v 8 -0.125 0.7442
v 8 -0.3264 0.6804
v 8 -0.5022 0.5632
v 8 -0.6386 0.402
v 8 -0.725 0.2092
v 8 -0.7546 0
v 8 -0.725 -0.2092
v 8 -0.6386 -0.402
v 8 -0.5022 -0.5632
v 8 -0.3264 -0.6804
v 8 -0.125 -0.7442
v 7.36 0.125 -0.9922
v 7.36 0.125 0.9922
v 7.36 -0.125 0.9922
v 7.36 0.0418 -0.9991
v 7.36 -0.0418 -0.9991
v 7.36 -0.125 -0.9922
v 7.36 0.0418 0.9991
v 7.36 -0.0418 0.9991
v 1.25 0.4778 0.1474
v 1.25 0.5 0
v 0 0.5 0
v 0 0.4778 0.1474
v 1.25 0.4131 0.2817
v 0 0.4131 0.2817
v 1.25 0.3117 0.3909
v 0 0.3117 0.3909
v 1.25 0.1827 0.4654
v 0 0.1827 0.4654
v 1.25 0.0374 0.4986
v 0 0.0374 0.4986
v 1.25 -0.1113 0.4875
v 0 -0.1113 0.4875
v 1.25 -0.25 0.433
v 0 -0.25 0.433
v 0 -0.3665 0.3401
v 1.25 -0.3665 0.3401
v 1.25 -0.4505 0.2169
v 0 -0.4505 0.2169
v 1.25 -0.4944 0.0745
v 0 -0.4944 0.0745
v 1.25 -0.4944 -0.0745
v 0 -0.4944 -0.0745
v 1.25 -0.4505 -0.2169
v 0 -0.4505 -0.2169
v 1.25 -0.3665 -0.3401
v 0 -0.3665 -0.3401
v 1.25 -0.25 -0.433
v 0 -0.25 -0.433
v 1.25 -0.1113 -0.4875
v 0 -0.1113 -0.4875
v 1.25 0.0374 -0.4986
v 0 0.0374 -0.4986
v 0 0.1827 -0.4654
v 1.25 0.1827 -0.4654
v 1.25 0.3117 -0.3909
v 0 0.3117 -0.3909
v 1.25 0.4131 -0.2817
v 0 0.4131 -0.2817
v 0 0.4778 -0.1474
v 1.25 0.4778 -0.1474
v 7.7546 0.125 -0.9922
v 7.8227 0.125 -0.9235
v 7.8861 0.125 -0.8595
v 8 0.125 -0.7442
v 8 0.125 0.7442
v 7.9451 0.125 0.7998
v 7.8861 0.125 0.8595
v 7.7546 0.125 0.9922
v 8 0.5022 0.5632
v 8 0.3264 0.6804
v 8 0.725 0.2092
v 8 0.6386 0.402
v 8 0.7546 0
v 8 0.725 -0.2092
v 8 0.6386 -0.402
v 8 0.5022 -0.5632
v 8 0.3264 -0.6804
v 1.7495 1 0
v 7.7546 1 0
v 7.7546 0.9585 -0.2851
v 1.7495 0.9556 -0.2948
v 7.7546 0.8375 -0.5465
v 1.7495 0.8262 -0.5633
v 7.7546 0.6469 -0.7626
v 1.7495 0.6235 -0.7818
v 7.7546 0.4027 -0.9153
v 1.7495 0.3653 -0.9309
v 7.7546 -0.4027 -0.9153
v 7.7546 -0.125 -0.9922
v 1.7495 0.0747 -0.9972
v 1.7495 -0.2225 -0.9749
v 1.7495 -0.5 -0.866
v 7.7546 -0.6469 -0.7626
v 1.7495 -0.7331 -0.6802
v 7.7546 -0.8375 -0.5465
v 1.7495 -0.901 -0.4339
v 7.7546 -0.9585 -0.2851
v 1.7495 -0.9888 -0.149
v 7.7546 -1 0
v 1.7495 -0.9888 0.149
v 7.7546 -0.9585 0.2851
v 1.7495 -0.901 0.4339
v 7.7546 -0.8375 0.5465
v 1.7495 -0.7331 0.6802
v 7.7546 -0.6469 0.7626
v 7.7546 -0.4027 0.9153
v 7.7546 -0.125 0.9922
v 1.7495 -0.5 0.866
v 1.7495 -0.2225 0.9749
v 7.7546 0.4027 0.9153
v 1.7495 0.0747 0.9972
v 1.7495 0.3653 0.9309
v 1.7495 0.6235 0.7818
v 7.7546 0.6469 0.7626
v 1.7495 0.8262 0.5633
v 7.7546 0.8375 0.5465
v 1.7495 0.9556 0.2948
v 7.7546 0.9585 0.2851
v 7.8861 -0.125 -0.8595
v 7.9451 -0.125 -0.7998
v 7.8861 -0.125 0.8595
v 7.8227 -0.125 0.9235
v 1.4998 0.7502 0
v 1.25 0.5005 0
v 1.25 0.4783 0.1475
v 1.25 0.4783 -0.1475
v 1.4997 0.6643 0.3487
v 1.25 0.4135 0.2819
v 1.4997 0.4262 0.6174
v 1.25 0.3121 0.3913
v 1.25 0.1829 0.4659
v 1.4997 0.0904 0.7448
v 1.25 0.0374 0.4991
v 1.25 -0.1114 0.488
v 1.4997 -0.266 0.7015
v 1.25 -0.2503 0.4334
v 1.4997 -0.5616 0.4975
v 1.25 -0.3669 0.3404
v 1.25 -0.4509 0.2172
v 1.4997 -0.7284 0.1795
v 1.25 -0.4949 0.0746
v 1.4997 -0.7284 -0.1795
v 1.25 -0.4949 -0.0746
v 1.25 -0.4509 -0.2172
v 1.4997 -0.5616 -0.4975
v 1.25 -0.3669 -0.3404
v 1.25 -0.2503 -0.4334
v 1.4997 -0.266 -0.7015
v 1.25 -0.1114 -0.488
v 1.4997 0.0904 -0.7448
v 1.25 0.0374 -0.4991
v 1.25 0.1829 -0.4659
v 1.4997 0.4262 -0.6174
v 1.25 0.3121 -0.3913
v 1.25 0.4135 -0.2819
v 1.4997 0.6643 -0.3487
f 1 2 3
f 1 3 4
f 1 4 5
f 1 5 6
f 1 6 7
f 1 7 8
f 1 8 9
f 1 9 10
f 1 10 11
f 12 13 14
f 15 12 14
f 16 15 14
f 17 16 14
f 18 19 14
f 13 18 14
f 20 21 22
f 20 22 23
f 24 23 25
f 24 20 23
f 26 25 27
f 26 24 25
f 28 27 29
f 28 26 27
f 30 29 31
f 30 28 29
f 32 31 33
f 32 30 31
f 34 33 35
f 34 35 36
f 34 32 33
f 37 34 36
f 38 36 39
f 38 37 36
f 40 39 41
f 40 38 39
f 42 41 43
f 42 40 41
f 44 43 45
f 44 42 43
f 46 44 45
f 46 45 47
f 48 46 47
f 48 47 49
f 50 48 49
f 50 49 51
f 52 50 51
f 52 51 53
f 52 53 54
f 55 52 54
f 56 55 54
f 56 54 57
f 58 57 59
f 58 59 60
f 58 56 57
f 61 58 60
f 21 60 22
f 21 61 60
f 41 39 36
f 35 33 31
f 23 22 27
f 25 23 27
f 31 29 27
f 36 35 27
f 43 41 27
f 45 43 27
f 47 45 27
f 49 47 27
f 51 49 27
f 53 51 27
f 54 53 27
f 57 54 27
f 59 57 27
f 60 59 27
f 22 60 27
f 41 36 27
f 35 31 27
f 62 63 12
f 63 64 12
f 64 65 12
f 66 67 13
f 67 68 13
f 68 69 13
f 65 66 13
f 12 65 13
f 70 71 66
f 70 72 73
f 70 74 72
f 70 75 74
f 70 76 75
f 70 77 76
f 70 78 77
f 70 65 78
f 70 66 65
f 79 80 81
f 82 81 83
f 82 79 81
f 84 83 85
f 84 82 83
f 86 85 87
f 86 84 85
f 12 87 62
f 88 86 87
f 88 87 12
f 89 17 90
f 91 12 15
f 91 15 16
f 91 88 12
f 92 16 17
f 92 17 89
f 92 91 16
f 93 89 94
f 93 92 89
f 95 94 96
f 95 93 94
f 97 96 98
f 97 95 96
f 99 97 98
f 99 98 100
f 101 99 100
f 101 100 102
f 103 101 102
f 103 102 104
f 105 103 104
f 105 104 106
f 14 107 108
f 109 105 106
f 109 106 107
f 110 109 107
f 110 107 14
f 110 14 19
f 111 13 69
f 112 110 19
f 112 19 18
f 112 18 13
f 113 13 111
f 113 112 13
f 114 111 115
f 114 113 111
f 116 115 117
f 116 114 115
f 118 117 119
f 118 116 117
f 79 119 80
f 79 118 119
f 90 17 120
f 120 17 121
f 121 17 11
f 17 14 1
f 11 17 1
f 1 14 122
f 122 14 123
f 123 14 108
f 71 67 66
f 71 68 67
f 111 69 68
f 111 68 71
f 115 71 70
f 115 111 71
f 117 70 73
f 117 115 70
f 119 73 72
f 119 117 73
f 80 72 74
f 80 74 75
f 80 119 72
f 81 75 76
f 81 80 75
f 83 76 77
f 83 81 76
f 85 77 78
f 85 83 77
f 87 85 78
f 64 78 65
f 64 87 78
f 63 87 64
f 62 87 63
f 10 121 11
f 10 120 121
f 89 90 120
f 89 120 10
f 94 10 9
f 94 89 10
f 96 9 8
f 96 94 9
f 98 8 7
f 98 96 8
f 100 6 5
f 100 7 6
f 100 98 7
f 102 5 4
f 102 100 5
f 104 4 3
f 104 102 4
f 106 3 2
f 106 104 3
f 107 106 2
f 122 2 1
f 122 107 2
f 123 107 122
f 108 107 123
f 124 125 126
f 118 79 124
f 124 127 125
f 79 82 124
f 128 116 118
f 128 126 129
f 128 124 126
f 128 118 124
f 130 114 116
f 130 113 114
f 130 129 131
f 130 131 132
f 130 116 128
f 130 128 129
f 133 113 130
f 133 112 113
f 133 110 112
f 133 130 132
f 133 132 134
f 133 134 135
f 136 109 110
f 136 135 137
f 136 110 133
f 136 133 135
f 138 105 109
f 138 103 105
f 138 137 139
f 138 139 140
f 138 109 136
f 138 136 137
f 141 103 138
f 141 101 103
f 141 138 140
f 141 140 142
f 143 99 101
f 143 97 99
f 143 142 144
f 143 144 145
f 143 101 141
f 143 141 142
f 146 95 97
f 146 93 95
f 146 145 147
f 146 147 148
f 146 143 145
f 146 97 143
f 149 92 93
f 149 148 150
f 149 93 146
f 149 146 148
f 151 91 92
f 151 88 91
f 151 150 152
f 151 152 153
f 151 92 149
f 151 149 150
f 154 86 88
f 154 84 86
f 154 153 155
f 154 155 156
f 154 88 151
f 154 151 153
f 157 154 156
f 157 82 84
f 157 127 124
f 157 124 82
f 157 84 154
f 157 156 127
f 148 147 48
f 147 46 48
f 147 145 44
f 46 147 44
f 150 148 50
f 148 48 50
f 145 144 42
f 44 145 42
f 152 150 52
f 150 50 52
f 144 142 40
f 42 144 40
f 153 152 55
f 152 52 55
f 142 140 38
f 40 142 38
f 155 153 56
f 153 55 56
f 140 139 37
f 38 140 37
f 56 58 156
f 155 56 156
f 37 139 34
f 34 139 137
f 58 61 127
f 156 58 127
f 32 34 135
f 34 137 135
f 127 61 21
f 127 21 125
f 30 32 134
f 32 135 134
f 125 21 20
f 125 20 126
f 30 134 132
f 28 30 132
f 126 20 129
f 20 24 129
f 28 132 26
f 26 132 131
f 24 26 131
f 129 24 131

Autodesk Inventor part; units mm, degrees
ref_plane "YZ Plane" through (0, 0, 0) normal (1, 0, 0) x (0, 1, 0)
ref_plane "XZ Plane" through (0, 0, 0) normal (0, 1, 0) x (-1, 0, 0)
sketch "Sketch1" plane through (0, 0, 0) normal (0, 0, 1) x (1, 0, 0)
  line L0 (0, 0) -> (8, 0)
  line L1 (8, 0) -> (8, 1)
  line L2 (8, 1) -> (1.25, 1)
  line L3 (0, -0.2) -> (0, 1.2) projected
  line L4 (0, 0.5) -> (0, 0)
  line L5 (0, 0.5) -> (1.25, 0.5)
  line L6 (1.25, 0.5) -> (1.25, 1)
  dimension "d1" = 8
  dimension "d2" = 1
  dimension "d13" = 2
  dimension "d14" = 1.25
revolve "Body" add sketch "Sketch1" angle 360 about axis through (0, 0, 0) along (1, 0, 0)
chamfer "Chamfer1" distance 0.2454 angle 45 1 edges at (8, -1, 0) measured on face at (8, -0.1923, -0.0109)
sketch "Sketch2" plane through (0, 0, 0) normal (0, 0, 1) x (1, 0, 0)
  line L0 (8, 0.7546) -> (8, -0.7546) projected
  line L1 (7.232, 0) -> (8.128, 0) projected
  line L2 (8, 0.125) -> (7.36, 0.125)
  line L3 (7.36, 0.125) -> (7.36, 0)
  line L4 (7.36, -0.125) -> (7.36, 0)
  line L5 (7.36, -0.125) -> (8, -0.125)
  dimension "d8" = 0.125
  dimension "d9" = 0.64
extrude "Slot" cut sketch "Sketch2" against normal mid plane 2
thread "Thread" size "M2x0.4" class "6g" standard "ISO Metric profile" length 6.75
chamfer "Chamfer2" distance 0.5 angle 45 1 edges at (1.25, -1, 0) measured on face at (1.25, 0.8236, -0.0798)
ref_plane "Work Plane1" through (4.625, 0, 0) normal (0, 0, -1) x (1, 0, 0)
equation "\"d8\" = 0.5 * SBR"
equation "\"d9\" = STI"
equation "\"d10\" = NND"
equation "\"d3\" = -0.5 * GD1 + 0.5 * NND"
equation "\"d4\" = FAWI"
equation "\"d37\" = -0.5 * GD1 + 0.5 * NND"
equation "\"d5\" = NLG - ZLG"
equation "\"d15\" = -0.5 * SPD + 0.5 * NND"
equation "\"d16\" = FAWI"
equation "\"d38\" = -0.5 * SPD + 0.5 * NND"
equation "\"d1\" = NLG"
equation "\"d2\" = SPD"
equation "\"d13\" = NND"
equation "\"d14\" = ZLG"
equation "\"NND\" = 2"
equation "\"NLG\" = 8"
equation "\"FAWI\" = 45deg"
equation "\"GD1\" = THREADDIA - 1.2269 * PTC"
equation "\"FAWI1\" = 45deg"
equation "\"SPD\" = 1"
equation "\"SBR\" = 0.25"
equation "\"STI\" = 0.64"
equation "\"ZLG\" = 1.25"
equation "\"GUL\" = 0.61345 * PTC"
equation "\"THREADDIA\" = 2"
equation "\"TOA\" = 30deg"
equation "\"PTC\" = 0.4"
equation "\"GAL\" = 0.61345 * PTC"
properties part number "ISO 7435 - M2 x 8" material "Stainless Steel, 440C"
